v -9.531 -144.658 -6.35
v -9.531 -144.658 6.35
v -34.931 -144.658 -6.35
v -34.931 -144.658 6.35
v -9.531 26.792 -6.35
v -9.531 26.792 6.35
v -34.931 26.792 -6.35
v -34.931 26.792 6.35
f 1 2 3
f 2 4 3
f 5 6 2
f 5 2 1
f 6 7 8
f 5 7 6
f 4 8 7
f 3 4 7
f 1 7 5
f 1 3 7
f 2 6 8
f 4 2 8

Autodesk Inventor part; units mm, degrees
ref_plane "YZ Plane" through (0, 0, 0) normal (1, 0, 0) x (0, 1, 0)
ref_plane "XZ Plane" through (0, 0, 0) normal (0, 1, 0) x (-1, 0, 0)
ref_plane "XY Plane" through (0, 0, 0) normal (0, 0, 1) x (1, 0, 0)
sketch "Sketch1" plane through (0, 0, 0) normal (0, 0, 1) x (1, 0, 0)
  line L0 (-22.2313, 26.7915) -> (109.8487, 26.7915)
  line L1 (109.8487, 26.7915) -> (109.8487, -144.6585)
  line L2 (109.8487, -144.6585) -> (-22.2313, -144.6585)
  line L3 (-22.2313, -144.6585) -> (-22.2313, 26.7915)
  line L4 (-22.2313, 26.7915) -> (-28.5813, 26.7915)
  line L5 (-28.5813, 26.7915) -> (-28.5813, 39.4915)
  line L6 (-28.5813, 39.4915) -> (116.1987, 39.4915)
  line L7 (116.1987, 39.4915) -> (116.1987, 26.7915)
  line L8 (116.1987, 26.7915) -> (128.8987, 26.7915)
  line L9 (128.8987, 26.7915) -> (128.8987, 14.0915)
  line L10 (128.8987, 14.0915) -> (116.1987, 14.0915)
  line L11 (116.1987, 14.0915) -> (116.1987, -131.9585)
  line L12 (116.1987, -131.9585) -> (128.8987, -131.9585)
  line L13 (128.8987, -131.9585) -> (128.8987, -144.6585)
  line L14 (128.8987, -144.6585) -> (116.1987, -144.6585)
  line L15 (116.1987, -144.6585) -> (116.1987, -154.1835)
  line L16 (116.1987, -154.1835) -> (-28.5813, -154.1835)
  line L17 (-28.5813, -154.1835) -> (-28.5813, -144.6585)
  line L18 (-28.5813, -144.6585) -> (-41.2813, -144.6585)
  line L19 (-41.2813, -144.6585) -> (-41.2813, -131.9585)
  line L20 (-41.2813, -131.9585) -> (-28.5813, -131.9585)
  line L21 (-28.5813, -131.9585) -> (-28.5813, 14.0915)
  line L22 (-28.5813, 14.0915) -> (-41.2813, 14.0915)
  line L23 (-41.2813, 14.0915) -> (-41.2813, 26.7915)
  line L24 (-41.2813, 26.7915) -> (-28.5813, 26.7915)
  line L25 (-22.2313, -144.6585) -> (-22.2313, -151.0085)
  line L26 (-22.2313, -151.0085) -> (15.8687, -151.0085)
  line L27 (15.8687, -151.0085) -> (15.8687, -144.6585)
  line L28 (15.8687, -144.6585) -> (22.2187, -144.6585)
  line L29 (22.2187, -144.6585) -> (22.2187, -151.0085)
  line L30 (109.8487, -144.6585) -> (109.8487, -151.0085)
  line L31 (109.8487, -151.0085) -> (71.7487, -151.0085)
  line L32 (71.7487, -151.0085) -> (71.7487, -144.6585)
  line L33 (71.7487, -144.6585) -> (65.3987, -144.6585)
  line L34 (65.3987, -144.6585) -> (65.3987, -151.0085)
  line L35 (65.3987, -151.0085) -> (22.2187, -151.0085)
  line L36 (-22.2313, 26.7915) -> (-22.2313, 33.1415)
  line L37 (-22.2313, 33.1415) -> (15.8687, 33.1415)
  line L38 (15.8687, 33.1415) -> (15.8687, 26.7915)
  line L39 (22.2187, 26.7915) -> (22.2187, 33.1415)
  line L40 (22.2187, 33.1415) -> (65.3987, 33.1415)
  line L41 (65.3987, 33.1415) -> (65.3987, 26.7915)
  line L42 (71.7487, 26.7915) -> (71.7487, 33.1415)
  line L43 (71.7487, 33.1415) -> (109.8487, 33.1415)
  line L44 (109.8487, 33.1415) -> (109.8487, 26.7915)
  circle A0 centre (-34.9313, 20.4415) radius 1.9812
  circle A1 centre (122.5487, 20.4415) radius 1.9812
  circle A2 centre (122.5487, -138.3085) radius 1.9812
  circle A3 centre (-34.9313, -138.3085) radius 1.9812
  point P0 (0, 0)
  dimension "d0" = 132.08
  dimension "d1" = 171.45
  dimension "d2" = 6.35
  dimension "d3" = 12.7
  dimension "d4" = 144.78
  dimension "d5" = 12.7
  dimension "d6" = 12.7
  dimension "d7" = 146.05
  dimension "d8" = 9.525
  dimension "d9" = 12.7
  dimension "d10" = 6.35
  dimension "d11" = 38.1
  dimension "d12" = 6.35
  dimension "d13" = 38.1
  dimension "d14" = 6.35
  dimension "d15" = 3.9624
  dimension "d16" = 3.9624
extrude "Extrusion1" add sketch "Sketch1" along normal blind 6.35
sketch "Sketch2" plane through (-28.5813, -154.1835, 0) normal (0, -1, 0) x (1, 0, 0)
  line L0 (144.78, 6.35) -> (0, 6.35) projected
  line L1 (0, 0) -> (0, 6.35) projected
  line L2 (0, 0) -> (144.78, 0) projected
  line L3 (144.78, 0) -> (144.78, 6.35) projected
  point P0 (28.5813, 0)
extrude "Extrusion2" add sketch "Sketch2" along normal blind 3.175
sketch "Sketch3" plane through (0, 0, 6.35) normal (0, 0, 1) x (1, 0, 0)
  line L0 (-28.5813, 14.0915) -> (-41.2813, 14.0915) projected
  line L1 (-28.5813, -131.9585) -> (-28.5813, 14.0915) projected
  line L2 (-41.2813, -131.9585) -> (-28.5813, -131.9585) projected
  line L3 (116.1987, -131.9585) -> (128.8987, -131.9585) projected
  line L4 (116.1987, 14.0915) -> (116.1987, -131.9585) projected
  line L5 (128.8987, 14.0915) -> (116.1987, 14.0915) projected
  line L6 (71.7487, 33.1415) -> (109.8487, 33.1415) projected
  line L7 (-41.2813, 14.0915) -> (-41.2813, -131.9585)
  line L8 (128.8987, 14.0915) -> (128.8987, -131.9585)
  point P0 (0, 0)
extrude "Extrusion3" add sketch "Sketch3" against normal blind 6.35
sketch "Sketch4" plane through (0, 0, 6.35) normal (0, 0, 1) x (1, 0, 0)
  line L0 (-28.5813, -157.3585) -> (-28.5813, -144.6585) projected
  line L1 (-28.5813, -157.3585) -> (116.1987, -157.3585) projected
  line L2 (116.1987, -144.6585) -> (116.1987, -157.3585) projected
  line L3 (109.8487, 33.1415) -> (109.8487, -151.0085) projected
  line L4 (-22.2313, -151.0085) -> (-22.2313, 33.1415) projected
  line L5 (15.8687, 26.7915) -> (22.2187, 26.7915) projected
  line L6 (71.7487, 33.1415) -> (109.8487, 33.1415) projected
  line L7 (15.8687, 26.7915) -> (-22.2313, 26.7915)
  line L8 (22.2187, 26.7915) -> (109.8487, 26.7915)
  line L9 (109.8487, 26.7915) -> (109.8487, 20.4415)
  line L10 (109.8487, 20.4415) -> (-22.2313, 20.4415)
  line L11 (-22.2313, 20.4415) -> (-22.2313, 26.7915)
  line L12 (-22.2313, -144.6585) -> (-22.2313, -138.3085)
  line L13 (-22.2313, -138.3085) -> (109.8487, -138.3085)
  line L14 (109.8487, -144.6585) -> (-22.2313, -144.6585)
  line L15 (-28.5813, -151.0085) -> (-41.2813, -151.0085)
  line L16 (-41.2813, -151.0085) -> (-41.2813, -157.3585)
  line L17 (-41.2813, -157.3585) -> (-28.5813, -157.3585)
  line L18 (116.1987, -151.0085) -> (128.8987, -151.0085)
  line L19 (128.8987, -151.0085) -> (128.8987, -157.3585)
  line L20 (128.8987, -157.3585) -> (116.1987, -157.3585)
  point P0 (0, 0)
extrude "Extrusion4" add sketch "Sketch4" against normal blind 6.35 contours L17 L16 L15 L0 | L2 L18 L19 L20 | L3 L10 L4 L7 L5 L8 | L3 L14 L4 L13
sketch "Sketch5" plane through (0, 0, 6.35) normal (0, 0, 1) x (1, 0, 0)
  line L0 (-28.5813, 26.7915) -> (-28.5813, 39.4915) projected
  line L1 (116.1987, 39.4915) -> (116.1987, 26.7915) projected
  line L2 (15.8687, 33.1415) -> (15.8687, 26.7915) projected
  line L3 (-28.5813, 39.4915) -> (-41.2813, 39.4915)
  line L4 (-41.2813, 39.4915) -> (-41.2813, 33.1415)
  line L5 (-41.2813, 33.1415) -> (-28.5813, 33.1415)
  line L6 (116.1987, 39.4915) -> (128.8987, 39.4915)
  line L7 (128.8987, 39.4915) -> (128.8987, 33.1415)
  line L8 (128.8987, 33.1415) -> (116.1987, 33.1415)
  point P0 (0, 0)
extrude "Extrusion5" add sketch "Sketch5" against normal blind 6.35
sketch "Sketch6" plane through (0, 0, 6.35) normal (0, 0, 1) x (1, 0, 0)
  line L0 (65.3987, -151.0085) -> (22.2187, -151.0085) projected
  line L1 (22.2187, -144.6585) -> (65.3987, -144.6585) projected
  line L2 (-22.2313, -144.6585) -> (15.8687, -144.6585) projected
  line L3 (109.8487, -151.0085) -> (71.7487, -151.0085) projected
  line L4 (65.3987, 26.7915) -> (22.2187, 26.7915) projected
  line L5 (109.8487, 26.7915) -> (71.7487, 26.7915) projected
  line L6 (-41.2813, 26.7915) -> (-28.5813, 26.7915) projected
  line L7 (-28.5813, -151.0085) -> (-41.2813, -151.0085) projected
  line L8 (128.8987, -151.0085) -> (116.1987, -151.0085) projected
  line L9 (116.1987, 26.7915) -> (128.8987, 26.7915) projected
  line L10 (-28.5813, 33.1415) -> (-34.9313, 33.1415)
  line L11 (-34.9313, 33.1415) -> (-34.9313, 26.7915)
  line L12 (-34.9313, 26.7915) -> (-28.5813, 26.7915)
  line L13 (-28.5813, 26.7915) -> (-28.5813, 33.1415)
  line L14 (15.8687, 33.1415) -> (10.0792, 33.1415)
  line L15 (10.0792, 33.1415) -> (10.0792, 26.7915)
  line L16 (10.0792, 26.7915) -> (15.8687, 26.7915)
  line L17 (15.8687, 26.7915) -> (15.8687, 33.1415)
  line L18 (22.2187, 33.1415) -> (28.5687, 33.1415)
  line L19 (28.5687, 33.1415) -> (28.5687, 26.7915)
  line L20 (28.5687, 26.7915) -> (22.2187, 26.7915)
  line L21 (22.2187, 26.7915) -> (22.2187, 33.1415)
  line L22 (65.3987, 33.1415) -> (59.0487, 33.1415)
  line L23 (59.0487, 33.1415) -> (59.0487, 26.7915)
  line L24 (59.0487, 26.7915) -> (65.3987, 26.7915)
  line L25 (65.3987, 26.7915) -> (65.3987, 33.1415)
  line L26 (71.7487, 33.1415) -> (78.0987, 33.1415)
  line L27 (78.0987, 33.1415) -> (78.0987, 26.7915)
  line L28 (78.0987, 26.7915) -> (71.7487, 26.7915)
  line L29 (71.7487, 26.7915) -> (71.7487, 33.1415)
  line L30 (116.1987, 33.1415) -> (122.5487, 33.1415)
  line L31 (122.5487, 33.1415) -> (122.5487, 26.7915)
  line L32 (122.5487, 26.7915) -> (116.1987, 26.7915)
  line L33 (116.1987, 26.7915) -> (116.1987, 33.1415)
  line L34 (-28.5813, -144.6585) -> (-34.9313, -144.6585)
  line L35 (-34.9313, -144.6585) -> (-34.9313, -151.0085)
  line L36 (-34.9313, -151.0085) -> (-28.5813, -151.0085)
  line L37 (-28.5813, -151.0085) -> (-28.5813, -144.6585)
  line L38 (10.0792, -144.6585) -> (28.5687, -144.6585)
  line L39 (28.5687, -144.6585) -> (28.5687, -151.0085)
  line L40 (28.5687, -151.0085) -> (10.0792, -151.0085)
  line L41 (10.0792, -151.0085) -> (10.0792, -144.6585)
  line L42 (59.0487, -144.6585) -> (78.0987, -144.6585)
  line L43 (78.0987, -144.6585) -> (78.0987, -151.0085)
  line L44 (78.0987, -151.0085) -> (59.0487, -151.0085)
  line L45 (59.0487, -151.0085) -> (59.0487, -144.6585)
  line L46 (116.1987, -144.6585) -> (122.5487, -144.6585)
  line L47 (122.5487, -144.6585) -> (122.5487, -151.0085)
  line L48 (122.5487, -151.0085) -> (116.1987, -151.0085)
  line L49 (116.1987, -151.0085) -> (116.1987, -144.6585)
  point P0 (0, 0)
  dimension "d27" = 6.35
  dimension "d28" = 6.35
  dimension "d29" = 6.35
  dimension "d30" = 6.35
  dimension "d31" = 6.35
extrude "Extrusion6" add sketch "Sketch6" against normal blind 6.35 contours L0 L45 L1 L42 L43 L3 L44 | L0 L40 L41 L2 L38 L1 L39 | L4 L21 L18 L19 | L4 L23 L22 L25 | L5 L29 L26 L27 | L11 L10 L13 L6 | L7 L35 L34 L37 | L8 L49 L46 L47 | L33 L30 L31 L9 | L17 L16 L15 L14
sketch "Sketch7" plane through (0, 0, 0) normal (0, 0, -1) x (-1, 0, 0)
  line L0 (-128.8987, 39.4915) -> (-90.7987, 39.4915)
  line L1 (-90.7987, 39.4915) -> (-90.7987, 115.6915)
  line L2 (-90.7987, 115.6915) -> (-128.8987, 115.6915)
  line L3 (-128.8987, 115.6915) -> (-128.8987, 39.4915)
  line L4 (-90.7987, 39.4915) -> (41.2813, 39.4915)
  line L5 (41.2813, 39.4915) -> (41.2813, 64.8915)
  line L6 (41.2813, 64.8915) -> (-90.7987, 64.8915)
  line L7 (-90.7987, 64.8915) -> (-90.7987, 39.4915)
  point P0 (0, 0)
  dimension "d34" = 38.1
  dimension "d35" = 76.2
  dimension "d36" = 25.4
extrude "Extrusion7" add sketch "Sketch7" against normal blind 6.35
sketch "Sketch8" plane through (0, 0, 0) normal (0, 0, -1) x (-1, 0, 0)
  line L0 (41.2813, 64.8915) -> (210.1913, 64.8915)
  line L1 (210.1913, 64.8915) -> (210.1913, 39.4915)
  line L2 (210.1913, 39.4915) -> (41.2813, 39.4915)
  line L3 (41.2813, 39.4915) -> (41.2813, 64.8915)
  line L4 (210.1913, 64.8915) -> (172.0913, 64.8915)
  line L5 (172.0913, 64.8915) -> (172.0913, 115.6915)
  line L6 (172.0913, 115.6915) -> (210.1913, 115.6915)
  line L7 (210.1913, 115.6915) -> (210.1913, 64.8915)
  point P0 (0, 0)
  dimension "d39" = 168.91
  dimension "d40" = 25.4
  dimension "d41" = 38.1
extrude "Extrusion8" add sketch "Sketch8" against normal blind 6.35
sketch "Sketch9" plane through (0, 0, 0) normal (0, 0, -1) x (-1, 0, 0)
  line L0 (-109.8487, 26.7915) -> (-109.8487, 33.1415) projected
  line L1 (-109.8487, 33.1415) -> (-78.0987, 33.1415) projected
  line L2 (-78.0987, 26.7915) -> (-78.0987, 33.1415) projected
  line L3 (-109.8487, 26.7915) -> (-78.0987, 26.7915) projected
  line L4 (-10.0792, 33.1415) -> (-10.0792, 26.7915) projected
  line L5 (-10.0792, 33.1415) -> (22.2313, 33.1415) projected
  line L6 (22.2313, 33.1415) -> (22.2313, 26.7915) projected
  line L7 (-10.0792, 26.7915) -> (22.2313, 26.7915) projected
  line L8 (-59.0487, 33.1415) -> (-28.5687, 33.1415) projected
  line L9 (-28.5687, 26.7915) -> (-28.5687, 33.1415) projected
  line L10 (-59.0487, 26.7915) -> (-28.5687, 26.7915) projected
  line L11 (-59.0487, 33.1415) -> (-59.0487, 26.7915) projected
  line L12 (-128.8987, 115.6915) -> (-128.8987, 33.1415) projected
  line L13 (-128.8987, 49.764) -> (41.2813, 49.764)
  line L14 (41.2813, 49.764) -> (41.2813, 26.7915)
  line L15 (41.2813, 26.7915) -> (-128.8987, 26.7915)
  line L16 (-128.8987, 26.7915) -> (-128.8987, 49.764)
  point P0 (0, 0)
extrude "Extrusion9" add sketch "Sketch9" against normal blind 6.35
sketch "Sketch10" plane through (0, 0, 0) normal (0, 0, -1) x (-1, 0, 0)
  line L0 (41.2813, 39.4915) -> (210.1913, 39.4915)
  line L1 (210.1913, 39.4915) -> (210.1913, 20.4415)
  line L2 (210.1913, 20.4415) -> (41.2813, 20.4415)
  line L3 (41.2813, 20.4415) -> (41.2813, 39.4915)
  point P0 (0, 0)
extrude "Extrusion10" add sketch "Sketch10" against normal blind 6.35
sketch "Sketch11" plane through (0, 0, 0) normal (0, 0, -1) x (-1, 0, 0)
  line L0 (-128.8987, 115.6915) -> (-90.7987, 115.6915)
  line L1 (-90.7987, 115.6915) -> (-90.7987, 141.0915)
  line L2 (-90.7987, 141.0915) -> (-128.8987, 141.0915)
  line L3 (-128.8987, 141.0915) -> (-128.8987, 115.6915)
  line L4 (172.0913, 115.6915) -> (210.1913, 115.6915)
  line L5 (210.1913, 115.6915) -> (210.1913, 141.0915)
  line L6 (210.1913, 141.0915) -> (172.0913, 141.0915)
  line L7 (172.0913, 141.0915) -> (172.0913, 115.6915)
  point P0 (0, 0)
  dimension "d48" = 25.4
extrude "Extrusion11" add sketch "Sketch11" against normal blind 6.35
sketch "Sketch12" plane through (0, 0, 0) normal (0, 0, -1) x (-1, 0, 0)
  line L0 (210.1913, 20.4415) -> (172.0913, 20.4415)
  line L1 (172.0913, 20.4415) -> (172.0913, 26.7915)
  line L2 (172.0913, 26.7915) -> (210.1913, 26.7915)
  line L3 (210.1913, 26.7915) -> (210.1913, 20.4415)
  line L4 (172.0913, 26.7915) -> (146.6913, 26.7915)
  line L5 (146.6913, 26.7915) -> (146.6913, 33.1415)
  line L6 (146.6913, 33.1415) -> (172.0913, 33.1415)
  line L7 (172.0913, 33.1415) -> (172.0913, 26.7915)
  line L8 (146.6913, 33.1415) -> (172.0913, 33.1415)
  line L9 (172.0913, 33.1415) -> (172.0913, 39.4915)
  line L10 (172.0913, 39.4915) -> (146.6913, 39.4915)
  line L11 (146.6913, 39.4915) -> (146.6913, 33.1415)
  line L12 (146.6913, 39.4915) -> (95.8913, 39.4915)
  line L13 (95.8913, 39.4915) -> (95.8913, 33.1415)
  line L14 (95.8913, 33.1415) -> (146.6913, 33.1415)
  line L15 (146.6913, 33.1415) -> (146.6913, 39.4915)
  line L16 (95.8913, 39.4915) -> (70.4913, 39.4915)
  line L17 (70.4913, 39.4915) -> (70.4913, 33.1415)
  line L18 (70.4913, 33.1415) -> (95.8913, 33.1415)
  line L19 (95.8913, 33.1415) -> (95.8913, 39.4915)
  line L20 (146.6913, 33.1415) -> (133.9913, 33.1415)
  line L21 (133.9913, 33.1415) -> (133.9913, 26.7915)
  line L22 (133.9913, 26.7915) -> (146.6913, 26.7915)
  line L23 (146.6913, 26.7915) -> (146.6913, 33.1415)
  line L24 (133.9913, 33.1415) -> (108.5913, 33.1415)
  line L25 (108.5913, 33.1415) -> (108.5913, 26.7915)
  line L26 (108.5913, 26.7915) -> (133.9913, 26.7915)
  line L27 (133.9913, 26.7915) -> (133.9913, 33.1415)
  line L28 (70.4913, 33.1415) -> (57.7913, 33.1415)
  line L29 (57.7913, 33.1415) -> (57.7913, 26.7915)
  line L30 (57.7913, 26.7915) -> (70.4913, 26.7915)
  line L31 (70.4913, 26.7915) -> (70.4913, 33.1415)
  line L32 (57.7913, 26.7915) -> (32.3913, 26.7915)
  line L33 (32.3913, 26.7915) -> (32.3913, 33.1415)
  line L34 (32.3913, 33.1415) -> (57.7913, 33.1415)
  line L35 (57.7913, 33.1415) -> (57.7913, 26.7915)
  line L36 (32.3913, 33.1415) -> (19.6913, 33.1415)
  line L37 (19.6913, 33.1415) -> (19.6913, 26.7915)
  line L38 (19.6913, 26.7915) -> (32.3913, 26.7915)
  line L39 (32.3913, 26.7915) -> (32.3913, 33.1415)
  line L40 (19.6913, 33.1415) -> (-5.7087, 33.1415)
  line L41 (-5.7087, 33.1415) -> (-5.7087, 39.4915)
  line L42 (-5.7087, 39.4915) -> (19.6913, 39.4915)
  line L43 (19.6913, 39.4915) -> (19.6913, 33.1415)
  line L44 (-5.7087, 33.1415) -> (-18.4087, 33.1415)
  line L45 (-18.4087, 33.1415) -> (-18.4087, 26.7915)
  line L46 (-18.4087, 26.7915) -> (-5.7087, 26.7915)
  line L47 (-5.7087, 26.7915) -> (-5.7087, 33.1415)
  line L48 (-18.4087, 33.1415) -> (-43.8087, 33.1415)
  line L49 (-43.8087, 33.1415) -> (-43.8087, 26.7915)
  line L50 (-43.8087, 26.7915) -> (-18.4087, 26.7915)
  line L51 (-18.4087, 26.7915) -> (-18.4087, 33.1415)
  line L52 (-43.8087, 33.1415) -> (-56.5087, 33.1415)
  line L53 (-56.5087, 33.1415) -> (-56.5087, 26.7915)
  line L54 (-56.5087, 26.7915) -> (-43.8087, 26.7915)
  line L55 (-43.8087, 26.7915) -> (-43.8087, 33.1415)
  line L56 (-56.5087, 33.1415) -> (-81.9087, 33.1415)
  line L57 (-81.9087, 33.1415) -> (-81.9087, 38.8107)
  line L58 (-81.9087, 38.8107) -> (-56.5087, 38.8107)
  line L59 (-56.5087, 38.8107) -> (-56.5087, 33.1415)
  line L60 (-81.9087, 33.1415) -> (-94.6087, 33.1415)
  line L61 (-94.6087, 33.1415) -> (-94.6087, 26.7915)
  line L62 (-94.6087, 26.7915) -> (-81.9087, 26.7915)
  line L63 (-81.9087, 26.7915) -> (-81.9087, 33.1415)
  line L64 (-94.6087, 26.7915) -> (-120.0087, 26.7915)
  line L65 (-120.0087, 26.7915) -> (-120.0087, 33.1415)
  line L66 (-120.0087, 33.1415) -> (-94.6087, 33.1415)
  line L67 (-94.6087, 33.1415) -> (-94.6087, 26.7915)
  point P0 (0, 0)
  dimension "d51" = 6.35
  dimension "d52" = 25.4
  dimension "d53" = 6.35
  dimension "d54" = 25.4
  dimension "d55" = 6.35
  dimension "d56" = 50.8
  dimension "d57" = 25.4
  dimension "d58" = 12.7
  dimension "d59" = 25.4
  dimension "d60" = 12.7
  dimension "d61" = 25.4
  dimension "d62" = 12.7
  dimension "d63" = 25.4
  dimension "d64" = 12.7
  dimension "d65" = 25.4
  dimension "d66" = 12.7
  dimension "d67" = 25.4
  dimension "d68" = 12.7
  dimension "d69" = 25.4
extrude "Extrusion12" cut sketch "Sketch12" against normal blind 6.35 contours L56 L57 L58 L59 | L40 L41 L42 L43 | L6 L11 L10 L9 | L26 L25 L14 L21 | L13 L18 L17 L16 | L29 L32 L33 L34 | L45 L50 L49 L48 | L61 L64 L65 L66
sketch "Sketch13" plane through (0, 0, 0) normal (0, 0, -1) x (-1, 0, 0)
  line L0 (210.1913, 20.4415) -> (210.1913, 141.0915) projected
  line L1 (210.1913, 20.4415) -> (203.8413, 20.4415)
  line L2 (203.8413, 20.4415) -> (203.8413, 64.8915)
  line L3 (203.8413, 64.8915) -> (210.1913, 64.8915)
  line L4 (210.1913, 64.8915) -> (210.1913, 20.4415)
  line L5 (203.8413, 64.8915) -> (210.1913, 64.8915)
  line L6 (210.1913, 64.8915) -> (210.1913, 90.2915)
  line L7 (210.1913, 90.2915) -> (203.8413, 90.2915)
  line L8 (203.8413, 90.2915) -> (203.8413, 64.8915)
  line L9 (203.8413, 90.2915) -> (210.1913, 90.2915)
  line L10 (210.1913, 90.2915) -> (210.1913, 115.6915)
  line L11 (210.1913, 115.6915) -> (203.8413, 115.6915)
  line L12 (203.8413, 115.6915) -> (203.8413, 90.2915)
  point P0 (0, 0)
  dimension "d72" = 6.35
  dimension "d73" = 25.4
  dimension "d74" = 25.4
extrude "Extrusion13" cut sketch "Sketch13" against normal blind 6.35 contours L1 L2 L3 L0 | L7 L12 L11 L0
sketch "Sketch14" plane through (0, 0, 0) normal (0, 0, -1) x (-1, 0, 0)
  line L0 (-90.7987, 64.8915) -> (-90.7987, 141.0915) projected
  line L1 (-128.8987, -144.6585) -> (-128.8987, 141.0915) projected
  line L2 (-128.8987, 141.0915) -> (-90.7987, 141.0915)
  line L3 (-90.7987, 141.0915) -> (-90.7987, 115.6915)
  line L4 (-90.7987, 115.6915) -> (-128.8987, 115.6915)
  line L5 (-128.8987, 115.6915) -> (-128.8987, 141.0915)
  line L6 (172.0913, 141.0915) -> (210.1913, 141.0915)
  line L7 (210.1913, 141.0915) -> (210.1913, 115.6915)
  line L8 (210.1913, 115.6915) -> (172.0913, 115.6915)
  line L9 (172.0913, 115.6915) -> (172.0913, 141.0915)
  line L10 (-128.8987, 90.2915) -> (-122.5487, 90.2915)
  line L11 (-122.5487, 90.2915) -> (-122.5487, 64.8915)
  line L12 (-122.5487, 64.8915) -> (-128.8987, 64.8915)
  line L13 (-128.8987, 64.8915) -> (-128.8987, 90.2915)
  point P0 (0, 0)
extrude "Extrusion14" cut sketch "Sketch14" against normal blind 6.35
sketch "Sketch15" plane through (0, 0, 0) normal (0, 0, -1) x (-1, 0, 0)
  line L0 (203.8413, 20.4415) -> (203.8413, 64.8915) projected
  line L1 (203.8413, 39.4915) -> (197.4913, 39.4915)
  line L2 (197.4913, 39.4915) -> (197.4913, 26.7915)
  line L3 (197.4913, 26.7915) -> (203.8413, 26.7915)
  line L4 (203.8413, 26.7915) -> (203.8413, 39.4915)
  point P0 (0, 0)
  dimension "d79" = 6.35
extrude "Extrusion15" cut sketch "Sketch15" against normal blind 6.35
sketch "Sketch16" plane through (0, 0, 0) normal (0, 0, -1) x (-1, 0, 0)
  line L0 (-128.8987, 90.2915) -> (-109.8487, 90.2915)
  line L1 (-109.8487, 90.2915) -> (-109.8487, 77.5915)
  line L2 (-109.8487, 77.5915) -> (-128.8987, 77.5915)
  line L3 (-128.8987, 77.5915) -> (-128.8987, 90.2915)
  line L4 (172.0913, 115.6915) -> (191.1413, 115.6915)
  line L5 (191.1413, 115.6915) -> (191.1413, 83.9415)
  line L6 (191.1413, 83.9415) -> (172.0913, 83.9415)
  line L7 (172.0913, 83.9415) -> (172.0913, 115.6915)
  circle A0 centre (-109.8487, 77.5915) radius 1.9812
  circle A1 centre (191.1413, 83.9415) radius 1.9812
  point P0 (0, 0)
  dimension "d82" = 19.05
  dimension "d83" = 3.9624
  dimension "d84" = 3.9624
extrude "Extrusion16" cut sketch "Sketch16" against normal blind 6.35 contours A0 L2 L1 | L1 L2 A0 | A1 L6 L5 | L5 L6 A1
sketch "Sketch17" plane through (0, 0, 0) normal (0, 0, -1) x (-1, 0, 0)
  line L0 (-122.5487, 90.2915) -> (-128.8987, 90.2915)
  line L1 (-128.8987, 90.2915) -> (-128.8987, 64.8915)
  line L2 (-128.8987, 64.8915) -> (-122.5487, 64.8915)
  line L3 (-122.5487, 64.8915) -> (-122.5487, 90.2915)
  point P0 (0, 0)
extrude "Extrusion17" add sketch "Sketch17" against normal blind 6.35
sketch "Sketch18" plane through (0, 0, 0) normal (0, 0, -1) x (-1, 0, 0)
  line L0 (-128.8987, -144.6585) -> (-128.8987, 115.6915) projected
  line L1 (-128.8987, 115.6915) -> (-122.5487, 115.6915)
  line L2 (-122.5487, 115.6915) -> (-122.5487, 90.2915)
  line L3 (-122.5487, 90.2915) -> (-128.8987, 90.2915)
  line L4 (-128.8987, 90.2915) -> (-128.8987, 115.6915)
  line L5 (-128.8987, 90.2915) -> (-122.5487, 90.2915)
  line L6 (-122.5487, 90.2915) -> (-122.5487, 64.8915)
  line L7 (-122.5487, 64.8915) -> (-128.8987, 64.8915)
  line L8 (-128.8987, 64.8915) -> (-128.8987, 90.2915)
  line L9 (-122.5487, 64.8915) -> (-128.8987, 64.8915)
  line L10 (-128.8987, 64.8915) -> (-128.8987, 39.4915)
  line L11 (-128.8987, 39.4915) -> (-122.5487, 39.4915)
  line L12 (-122.5487, 39.4915) -> (-122.5487, 64.8915)
  point P0 (0, 0)
  dimension "d89" = 25.4
  dimension "d90" = 25.4
  dimension "d91" = 25.4
extrude "Extrusion18" cut sketch "Sketch18" against normal blind 6.35 contours L0 L7 L12 L11 | L0 L1 L2 L3
sketch "Sketch19" plane through (0, 0, 0) normal (0, 0, -1) x (-1, 0, 0)
  line L0 (-122.5487, 90.2915) -> (-128.8987, 90.2915) projected
  line L1 (-128.8987, 64.8915) -> (-128.8987, 90.2915) projected
  line L2 (-128.8987, 64.8915) -> (-122.5487, 64.8915) projected
  line L3 (-122.5487, 64.8915) -> (-122.5487, 39.4915) projected
  line L4 (197.4913, 39.4915) -> (203.8413, 39.4915) projected
  line L5 (203.8413, 39.4915) -> (203.8413, 64.8915) projected
  line L6 (203.8413, 64.8915) -> (210.1913, 64.8915) projected
  line L7 (210.1913, 64.8915) -> (210.1913, 90.2915) projected
  line L8 (210.1913, 90.2915) -> (203.8413, 90.2915) projected
  line L9 (203.8413, 90.2915) -> (203.8413, 115.6915) projected
  line L10 (203.8413, 115.6915) -> (172.0913, 115.6915) projected
  line L11 (172.0913, 115.6915) -> (172.0913, 64.8915) projected
  line L12 (172.0913, 64.8915) -> (-90.7987, 64.8915) projected
  line L13 (-90.7987, 64.8915) -> (-90.7987, 115.6915) projected
  line L14 (-90.7987, 115.6915) -> (-122.5487, 115.6915) projected
  line L15 (-122.5487, 115.6915) -> (-122.5487, 90.2915) projected
  circle A0 centre (191.1413, 83.9415) radius 1.9812 projected
  circle A1 centre (-109.8487, 77.5915) radius 1.9812 projected
  line L16 (-81.9087, 38.8107) -> (-56.5087, 38.8107) projected
  line L17 (22.2313, 20.4415) -> (22.2313, -138.3085) projected
  line L18 (-122.5487, 39.4915) -> (197.4913, 39.4915)
  line L19 (-81.9087, 38.8107) -> (-81.9087, 39.4915)
  line L20 (-56.5087, 38.8107) -> (-56.5087, 39.4915)
  point P0 (0, 0)
extrude "Extrusion19" cut sketch "Sketch19" against normal blind 25.4
sketch "Sketch20" plane through (0, 0, 0) normal (0, 0, -1) x (-1, 0, 0)
  line L0 (32.3913, 33.1415) -> (57.7913, 33.1415) projected
  line L1 (57.7913, 33.1415) -> (57.7913, 26.7915) projected
  line L2 (57.7913, 26.7915) -> (32.3913, 26.7915) projected
  line L3 (32.3913, 26.7915) -> (32.3913, 33.1415) projected
  line L4 (-43.8087, 26.7915) -> (-43.8087, 33.1415) projected
  line L5 (-43.8087, 33.1415) -> (-18.4087, 33.1415) projected
  line L6 (-18.4087, 33.1415) -> (-18.4087, 26.7915) projected
  line L7 (-18.4087, 26.7915) -> (-43.8087, 26.7915) projected
  line L8 (108.5913, 26.7915) -> (108.5913, 33.1415) projected
  line L9 (108.5913, 33.1415) -> (133.9913, 33.1415) projected
  line L10 (133.9913, 33.1415) -> (133.9913, 26.7915) projected
  line L11 (133.9913, 26.7915) -> (108.5913, 26.7915) projected
  line L12 (-120.0087, 33.1415) -> (-94.6087, 33.1415) projected
  line L13 (-94.6087, 33.1415) -> (-94.6087, 26.7915) projected
  line L14 (-94.6087, 26.7915) -> (-120.0087, 26.7915) projected
  line L15 (-120.0087, 26.7915) -> (-120.0087, 33.1415) projected
  line L16 (-128.8987, 39.4915) -> (203.8413, 39.4915)
  line L17 (203.8413, 39.4915) -> (203.8413, 26.7915)
  line L18 (203.8413, 26.7915) -> (-128.8987, 26.7915)
  line L19 (-128.8987, 26.7915) -> (-128.8987, 39.4915)
  line L20 (203.8413, 26.7915) -> (41.2813, 26.7915)
  line L21 (41.2813, 26.7915) -> (41.2813, 20.4415)
  line L22 (41.2813, 20.4415) -> (203.8413, 20.4415)
  line L23 (203.8413, 20.4415) -> (203.8413, 26.7915)
  point P0 (0, 0)
extrude "Extrusion20" cut sketch "Sketch20" against normal blind 25.4 contours L3 L18 L6 L5 L4 L13 L12 L15 L19 L16 L17 L10 L9 L8 L1 L0 | L0 L1 L2 L3 | L18 L11 L23 L22 L21 L2 | L7 L4 L5 L6 | L14 L15 L12 L13
sketch "Sketch21" plane through (0, 0, 6.35) normal (0, 0, 1) x (1, 0, 0)
  line L0 (128.8987, -157.3585) -> (128.8987, -151.0085) projected
  line L1 (128.8987, -151.0085) -> (122.5487, -151.0085) projected
  line L2 (122.5487, -151.0085) -> (122.5487, -144.6585) projected
  line L3 (128.8987, -144.6585) -> (122.5487, -144.6585) projected
  line L4 (128.8987, 26.7915) -> (128.8987, -144.6585) projected
  line L5 (128.8987, 26.7915) -> (-41.2813, 26.7915) projected
  line L6 (-22.2313, -138.3085) -> (-22.2313, 20.4415) projected
  line L7 (-22.2313, 20.4415) -> (109.8487, 20.4415) projected
  line L8 (109.8487, 20.4415) -> (109.8487, -138.3085) projected
  line L9 (109.8487, -138.3085) -> (-22.2313, -138.3085) projected
  line L10 (78.0987, -144.6585) -> (109.8487, -144.6585) projected
  line L11 (109.8487, -144.6585) -> (109.8487, -151.0085) projected
  line L12 (109.8487, -151.0085) -> (78.0987, -151.0085) projected
  line L13 (78.0987, -151.0085) -> (78.0987, -144.6585) projected
  circle A0 centre (122.5487, -138.3085) radius 1.9812 projected
  circle A1 centre (122.5487, 20.4415) radius 1.9812 projected
  line L14 (10.0792, -151.0085) -> (-22.2313, -151.0085) projected
  line L15 (-22.2313, -151.0085) -> (-22.2313, -144.6585) projected
  line L16 (-22.2313, -144.6585) -> (10.0792, -144.6585) projected
  line L17 (10.0792, -144.6585) -> (10.0792, -151.0085) projected
  line L18 (28.5687, -144.6585) -> (59.0487, -144.6585) projected
  line L19 (59.0487, -144.6585) -> (59.0487, -151.0085) projected
  line L20 (59.0487, -151.0085) -> (28.5687, -151.0085) projected
  line L21 (28.5687, -151.0085) -> (28.5687, -144.6585) projected
  line L22 (-22.2313, 26.7915) -> (128.8987, 26.7915)
  line L23 (128.8987, 26.7915) -> (128.8987, -157.3585)
  line L24 (128.8987, -157.3585) -> (-22.2313, -157.3585)
  line L25 (-22.2313, -157.3585) -> (-22.2313, 26.7915)
  line L26 (128.8987, -157.3585) -> (-41.2813, -157.3585)
  line L27 (-41.2813, -157.3585) -> (-41.2813, -144.6585)
  line L28 (-41.2813, -144.6585) -> (128.8987, -144.6585)
  line L29 (128.8987, -144.6585) -> (128.8987, -157.3585)
  point P0 (0, 0)
extrude "Extrusion21" cut sketch "Sketch21" against normal blind 25.4 contours L24 L25 L14 L17 L28 L21 L20 L19 L13 L12 L11 L2 L1 L0 | L1 L2 L3 L23 | L26 L27 L28 L15 L25 | L3 L28 L10 L18 L16 L25 L9 L8 L7 L5 L4 | L15 L16 L17 L14 | L11 L12 L13 L10 | L18 L19 L20 L21
sketch "Sketch22" plane through (0, 0, 6.35) normal (0, 0, 1) x (1, 0, 0)
  line L0 (-22.2313, -144.6585) -> (-22.2313, 26.7915) projected
  line L1 (-22.2313, 26.7915) -> (-41.2813, 26.7915) projected
  line L2 (-41.2813, 26.7915) -> (-41.2813, -144.6585) projected
  line L3 (-22.2313, -144.6585) -> (-41.2813, -144.6585) projected
  circle A0 centre (-34.9313, -138.3085) radius 1.9812 projected
  circle A1 centre (-34.9313, 20.4415) radius 1.9812 projected
  point P0 (0, 0)
extrude "Extrusion22" add sketch "Sketch22" against normal blind 12.7
sketch "Sketch23" plane through (0, 0, 6.35) normal (0, 0, 1) x (1, 0, 0)
  circle A0 centre (-34.9313, -138.3085) radius 1.9812 projected
  circle A1 centre (-34.9313, 20.4415) radius 1.9812 projected
  point P0 (0, 0)
extrude "Extrusion23" add sketch "Sketch23" against normal blind 12.7
sketch "Sketch24" plane through (0, 0, 6.35) normal (0, 0, 1) x (1, 0, 0)
  line L0 (-22.2313, -144.6585) -> (-41.2813, -144.6585) projected
  line L1 (-41.2813, 26.7915) -> (-34.9313, 26.7915)
  line L2 (-34.9313, 26.7915) -> (-34.9313, -144.6585)
  line L3 (-34.9313, -144.6585) -> (-41.2813, -144.6585)
  line L4 (-41.2813, -144.6585) -> (-41.2813, 26.7915)
  point P0 (0, 0)
  dimension "d104" = 6.35
extrude "Extrusion24" cut sketch "Sketch24" against normal blind 12.7
sketch "Sketch25" plane through (-22.2313, 26.7915, 6.35) normal (0, 1, 0) x (1, 0, 0)
  line L0 (-12.7, 12.7) -> (-12.7, 0) projected
  line L1 (0, 0) -> (-12.7, 0) projected
  line L2 (0, 0) -> (0, 12.7) projected
  line L3 (0, 12.7) -> (-12.7, 12.7) projected
  point P0 (22.2313, 6.35)
extrude "Extrusion25" add sketch "Sketch25" along normal blind 12.7
sketch "Sketch26" plane through (-22.2313, -144.6585, -6.35) normal (0, -1, 0) x (1, 0, 0)
  line L0 (-12.7, 12.7) -> (-12.7, 0) projected
  line L1 (-12.7, 0) -> (0, 0) projected
  line L2 (0, 12.7) -> (0, 0) projected
  line L3 (0, 12.7) -> (-12.7, 12.7) projected
  point P0 (22.2313, 6.35)
extrude "Extrusion26" add sketch "Sketch26" along normal blind 6.35
sketch "Sketch27" plane through (-22.2313, 39.4915, 6.35) normal (1, 0, 0) x (0, 0, -1)
  line L0 (0, -190.5) -> (0, 0) projected
  line L1 (0, -190.5) -> (12.7, -190.5) projected
  line L2 (12.7, -190.5) -> (12.7, 0) projected
  line L3 (12.7, 0) -> (0, 0) projected
  point P0 (6.35, -39.4915)
extrude "Extrusion27" add sketch "Sketch27" along normal blind 6.35
sketch "Sketch28" plane through (0, 0, -6.35) normal (0, 0, -1) x (-1, 0, 0)
  line L0 (34.9313, -151.0085) -> (34.9313, 39.4915) projected
  line L1 (15.8813, 39.4915) -> (15.8813, -151.0085) projected
  line L2 (15.8813, -151.0085) -> (34.9313, -151.0085) projected
  line L3 (15.8813, -151.0085) -> (15.8813, -144.6585)
  line L4 (15.8813, -144.6585) -> (34.9313, -144.6585)
  point P0 (0, 0)
  dimension "d113" = 6.35
extrude "Extrusion28" cut sketch "Sketch28" against normal blind 12.7
sketch "Sketch29" plane through (-15.8813, 39.4915, 6.35) normal (1, 0, 0) x (0, 0, -1)
  line L0 (0, -184.15) -> (12.7, -184.15) projected
  line L1 (12.7, 0) -> (12.7, -184.15) projected
  line L2 (0, 0) -> (12.7, 0) projected
  line L3 (0, -184.15) -> (0, 0) projected
  point P0 (6.35, -39.4915)
extrude "Extrusion29" add sketch "Sketch29" along normal blind 6.35
sketch "Sketch30" plane through (-22.2313, 39.4915, 6.35) normal (0, 1, 0) x (1, 0, 0)
  line L0 (-12.7, 12.7) -> (12.7, 12.7) projected
  line L1 (-12.7, 0) -> (-12.7, 12.7) projected
  line L2 (12.7, 0) -> (-12.7, 0) projected
  line L3 (12.7, 0) -> (12.7, 12.7) projected
  point P0 (22.2313, 6.35)
extrude "Extrusion30" add sketch "Sketch30" along normal blind 12.7
sketch "Sketch31" plane through (-22.2313, 52.1915, 6.35) normal (0, 1, 0) x (1, 0, 0)
  line L0 (12.7, 12.7) -> (12.7, 0) projected
  line L1 (-12.7, 12.7) -> (12.7, 12.7) projected
  line L2 (-12.7, 0) -> (-12.7, 12.7) projected
  line L3 (12.7, 0) -> (-12.7, 0) projected
  point P0 (22.2313, 6.35)
extrude "Extrusion31" cut sketch "Sketch31" against normal blind 6.35
sketch "Sketch32" plane through (-22.2313, 45.8415, 6.35) normal (0, 1, 0) x (1, 0, 0)
  line L0 (-12.7, 12.7) -> (12.7, 12.7) projected
  line L1 (-12.7, 0) -> (-12.7, 12.7) projected
  line L2 (12.7, 0) -> (-12.7, 0) projected
  line L3 (12.7, 12.7) -> (12.7, 0) projected
  point P0 (22.2313, 6.35)
extrude "Extrusion32" cut sketch "Sketch32" against normal blind 19.05
properties part number "top-bot connector lame longer"
